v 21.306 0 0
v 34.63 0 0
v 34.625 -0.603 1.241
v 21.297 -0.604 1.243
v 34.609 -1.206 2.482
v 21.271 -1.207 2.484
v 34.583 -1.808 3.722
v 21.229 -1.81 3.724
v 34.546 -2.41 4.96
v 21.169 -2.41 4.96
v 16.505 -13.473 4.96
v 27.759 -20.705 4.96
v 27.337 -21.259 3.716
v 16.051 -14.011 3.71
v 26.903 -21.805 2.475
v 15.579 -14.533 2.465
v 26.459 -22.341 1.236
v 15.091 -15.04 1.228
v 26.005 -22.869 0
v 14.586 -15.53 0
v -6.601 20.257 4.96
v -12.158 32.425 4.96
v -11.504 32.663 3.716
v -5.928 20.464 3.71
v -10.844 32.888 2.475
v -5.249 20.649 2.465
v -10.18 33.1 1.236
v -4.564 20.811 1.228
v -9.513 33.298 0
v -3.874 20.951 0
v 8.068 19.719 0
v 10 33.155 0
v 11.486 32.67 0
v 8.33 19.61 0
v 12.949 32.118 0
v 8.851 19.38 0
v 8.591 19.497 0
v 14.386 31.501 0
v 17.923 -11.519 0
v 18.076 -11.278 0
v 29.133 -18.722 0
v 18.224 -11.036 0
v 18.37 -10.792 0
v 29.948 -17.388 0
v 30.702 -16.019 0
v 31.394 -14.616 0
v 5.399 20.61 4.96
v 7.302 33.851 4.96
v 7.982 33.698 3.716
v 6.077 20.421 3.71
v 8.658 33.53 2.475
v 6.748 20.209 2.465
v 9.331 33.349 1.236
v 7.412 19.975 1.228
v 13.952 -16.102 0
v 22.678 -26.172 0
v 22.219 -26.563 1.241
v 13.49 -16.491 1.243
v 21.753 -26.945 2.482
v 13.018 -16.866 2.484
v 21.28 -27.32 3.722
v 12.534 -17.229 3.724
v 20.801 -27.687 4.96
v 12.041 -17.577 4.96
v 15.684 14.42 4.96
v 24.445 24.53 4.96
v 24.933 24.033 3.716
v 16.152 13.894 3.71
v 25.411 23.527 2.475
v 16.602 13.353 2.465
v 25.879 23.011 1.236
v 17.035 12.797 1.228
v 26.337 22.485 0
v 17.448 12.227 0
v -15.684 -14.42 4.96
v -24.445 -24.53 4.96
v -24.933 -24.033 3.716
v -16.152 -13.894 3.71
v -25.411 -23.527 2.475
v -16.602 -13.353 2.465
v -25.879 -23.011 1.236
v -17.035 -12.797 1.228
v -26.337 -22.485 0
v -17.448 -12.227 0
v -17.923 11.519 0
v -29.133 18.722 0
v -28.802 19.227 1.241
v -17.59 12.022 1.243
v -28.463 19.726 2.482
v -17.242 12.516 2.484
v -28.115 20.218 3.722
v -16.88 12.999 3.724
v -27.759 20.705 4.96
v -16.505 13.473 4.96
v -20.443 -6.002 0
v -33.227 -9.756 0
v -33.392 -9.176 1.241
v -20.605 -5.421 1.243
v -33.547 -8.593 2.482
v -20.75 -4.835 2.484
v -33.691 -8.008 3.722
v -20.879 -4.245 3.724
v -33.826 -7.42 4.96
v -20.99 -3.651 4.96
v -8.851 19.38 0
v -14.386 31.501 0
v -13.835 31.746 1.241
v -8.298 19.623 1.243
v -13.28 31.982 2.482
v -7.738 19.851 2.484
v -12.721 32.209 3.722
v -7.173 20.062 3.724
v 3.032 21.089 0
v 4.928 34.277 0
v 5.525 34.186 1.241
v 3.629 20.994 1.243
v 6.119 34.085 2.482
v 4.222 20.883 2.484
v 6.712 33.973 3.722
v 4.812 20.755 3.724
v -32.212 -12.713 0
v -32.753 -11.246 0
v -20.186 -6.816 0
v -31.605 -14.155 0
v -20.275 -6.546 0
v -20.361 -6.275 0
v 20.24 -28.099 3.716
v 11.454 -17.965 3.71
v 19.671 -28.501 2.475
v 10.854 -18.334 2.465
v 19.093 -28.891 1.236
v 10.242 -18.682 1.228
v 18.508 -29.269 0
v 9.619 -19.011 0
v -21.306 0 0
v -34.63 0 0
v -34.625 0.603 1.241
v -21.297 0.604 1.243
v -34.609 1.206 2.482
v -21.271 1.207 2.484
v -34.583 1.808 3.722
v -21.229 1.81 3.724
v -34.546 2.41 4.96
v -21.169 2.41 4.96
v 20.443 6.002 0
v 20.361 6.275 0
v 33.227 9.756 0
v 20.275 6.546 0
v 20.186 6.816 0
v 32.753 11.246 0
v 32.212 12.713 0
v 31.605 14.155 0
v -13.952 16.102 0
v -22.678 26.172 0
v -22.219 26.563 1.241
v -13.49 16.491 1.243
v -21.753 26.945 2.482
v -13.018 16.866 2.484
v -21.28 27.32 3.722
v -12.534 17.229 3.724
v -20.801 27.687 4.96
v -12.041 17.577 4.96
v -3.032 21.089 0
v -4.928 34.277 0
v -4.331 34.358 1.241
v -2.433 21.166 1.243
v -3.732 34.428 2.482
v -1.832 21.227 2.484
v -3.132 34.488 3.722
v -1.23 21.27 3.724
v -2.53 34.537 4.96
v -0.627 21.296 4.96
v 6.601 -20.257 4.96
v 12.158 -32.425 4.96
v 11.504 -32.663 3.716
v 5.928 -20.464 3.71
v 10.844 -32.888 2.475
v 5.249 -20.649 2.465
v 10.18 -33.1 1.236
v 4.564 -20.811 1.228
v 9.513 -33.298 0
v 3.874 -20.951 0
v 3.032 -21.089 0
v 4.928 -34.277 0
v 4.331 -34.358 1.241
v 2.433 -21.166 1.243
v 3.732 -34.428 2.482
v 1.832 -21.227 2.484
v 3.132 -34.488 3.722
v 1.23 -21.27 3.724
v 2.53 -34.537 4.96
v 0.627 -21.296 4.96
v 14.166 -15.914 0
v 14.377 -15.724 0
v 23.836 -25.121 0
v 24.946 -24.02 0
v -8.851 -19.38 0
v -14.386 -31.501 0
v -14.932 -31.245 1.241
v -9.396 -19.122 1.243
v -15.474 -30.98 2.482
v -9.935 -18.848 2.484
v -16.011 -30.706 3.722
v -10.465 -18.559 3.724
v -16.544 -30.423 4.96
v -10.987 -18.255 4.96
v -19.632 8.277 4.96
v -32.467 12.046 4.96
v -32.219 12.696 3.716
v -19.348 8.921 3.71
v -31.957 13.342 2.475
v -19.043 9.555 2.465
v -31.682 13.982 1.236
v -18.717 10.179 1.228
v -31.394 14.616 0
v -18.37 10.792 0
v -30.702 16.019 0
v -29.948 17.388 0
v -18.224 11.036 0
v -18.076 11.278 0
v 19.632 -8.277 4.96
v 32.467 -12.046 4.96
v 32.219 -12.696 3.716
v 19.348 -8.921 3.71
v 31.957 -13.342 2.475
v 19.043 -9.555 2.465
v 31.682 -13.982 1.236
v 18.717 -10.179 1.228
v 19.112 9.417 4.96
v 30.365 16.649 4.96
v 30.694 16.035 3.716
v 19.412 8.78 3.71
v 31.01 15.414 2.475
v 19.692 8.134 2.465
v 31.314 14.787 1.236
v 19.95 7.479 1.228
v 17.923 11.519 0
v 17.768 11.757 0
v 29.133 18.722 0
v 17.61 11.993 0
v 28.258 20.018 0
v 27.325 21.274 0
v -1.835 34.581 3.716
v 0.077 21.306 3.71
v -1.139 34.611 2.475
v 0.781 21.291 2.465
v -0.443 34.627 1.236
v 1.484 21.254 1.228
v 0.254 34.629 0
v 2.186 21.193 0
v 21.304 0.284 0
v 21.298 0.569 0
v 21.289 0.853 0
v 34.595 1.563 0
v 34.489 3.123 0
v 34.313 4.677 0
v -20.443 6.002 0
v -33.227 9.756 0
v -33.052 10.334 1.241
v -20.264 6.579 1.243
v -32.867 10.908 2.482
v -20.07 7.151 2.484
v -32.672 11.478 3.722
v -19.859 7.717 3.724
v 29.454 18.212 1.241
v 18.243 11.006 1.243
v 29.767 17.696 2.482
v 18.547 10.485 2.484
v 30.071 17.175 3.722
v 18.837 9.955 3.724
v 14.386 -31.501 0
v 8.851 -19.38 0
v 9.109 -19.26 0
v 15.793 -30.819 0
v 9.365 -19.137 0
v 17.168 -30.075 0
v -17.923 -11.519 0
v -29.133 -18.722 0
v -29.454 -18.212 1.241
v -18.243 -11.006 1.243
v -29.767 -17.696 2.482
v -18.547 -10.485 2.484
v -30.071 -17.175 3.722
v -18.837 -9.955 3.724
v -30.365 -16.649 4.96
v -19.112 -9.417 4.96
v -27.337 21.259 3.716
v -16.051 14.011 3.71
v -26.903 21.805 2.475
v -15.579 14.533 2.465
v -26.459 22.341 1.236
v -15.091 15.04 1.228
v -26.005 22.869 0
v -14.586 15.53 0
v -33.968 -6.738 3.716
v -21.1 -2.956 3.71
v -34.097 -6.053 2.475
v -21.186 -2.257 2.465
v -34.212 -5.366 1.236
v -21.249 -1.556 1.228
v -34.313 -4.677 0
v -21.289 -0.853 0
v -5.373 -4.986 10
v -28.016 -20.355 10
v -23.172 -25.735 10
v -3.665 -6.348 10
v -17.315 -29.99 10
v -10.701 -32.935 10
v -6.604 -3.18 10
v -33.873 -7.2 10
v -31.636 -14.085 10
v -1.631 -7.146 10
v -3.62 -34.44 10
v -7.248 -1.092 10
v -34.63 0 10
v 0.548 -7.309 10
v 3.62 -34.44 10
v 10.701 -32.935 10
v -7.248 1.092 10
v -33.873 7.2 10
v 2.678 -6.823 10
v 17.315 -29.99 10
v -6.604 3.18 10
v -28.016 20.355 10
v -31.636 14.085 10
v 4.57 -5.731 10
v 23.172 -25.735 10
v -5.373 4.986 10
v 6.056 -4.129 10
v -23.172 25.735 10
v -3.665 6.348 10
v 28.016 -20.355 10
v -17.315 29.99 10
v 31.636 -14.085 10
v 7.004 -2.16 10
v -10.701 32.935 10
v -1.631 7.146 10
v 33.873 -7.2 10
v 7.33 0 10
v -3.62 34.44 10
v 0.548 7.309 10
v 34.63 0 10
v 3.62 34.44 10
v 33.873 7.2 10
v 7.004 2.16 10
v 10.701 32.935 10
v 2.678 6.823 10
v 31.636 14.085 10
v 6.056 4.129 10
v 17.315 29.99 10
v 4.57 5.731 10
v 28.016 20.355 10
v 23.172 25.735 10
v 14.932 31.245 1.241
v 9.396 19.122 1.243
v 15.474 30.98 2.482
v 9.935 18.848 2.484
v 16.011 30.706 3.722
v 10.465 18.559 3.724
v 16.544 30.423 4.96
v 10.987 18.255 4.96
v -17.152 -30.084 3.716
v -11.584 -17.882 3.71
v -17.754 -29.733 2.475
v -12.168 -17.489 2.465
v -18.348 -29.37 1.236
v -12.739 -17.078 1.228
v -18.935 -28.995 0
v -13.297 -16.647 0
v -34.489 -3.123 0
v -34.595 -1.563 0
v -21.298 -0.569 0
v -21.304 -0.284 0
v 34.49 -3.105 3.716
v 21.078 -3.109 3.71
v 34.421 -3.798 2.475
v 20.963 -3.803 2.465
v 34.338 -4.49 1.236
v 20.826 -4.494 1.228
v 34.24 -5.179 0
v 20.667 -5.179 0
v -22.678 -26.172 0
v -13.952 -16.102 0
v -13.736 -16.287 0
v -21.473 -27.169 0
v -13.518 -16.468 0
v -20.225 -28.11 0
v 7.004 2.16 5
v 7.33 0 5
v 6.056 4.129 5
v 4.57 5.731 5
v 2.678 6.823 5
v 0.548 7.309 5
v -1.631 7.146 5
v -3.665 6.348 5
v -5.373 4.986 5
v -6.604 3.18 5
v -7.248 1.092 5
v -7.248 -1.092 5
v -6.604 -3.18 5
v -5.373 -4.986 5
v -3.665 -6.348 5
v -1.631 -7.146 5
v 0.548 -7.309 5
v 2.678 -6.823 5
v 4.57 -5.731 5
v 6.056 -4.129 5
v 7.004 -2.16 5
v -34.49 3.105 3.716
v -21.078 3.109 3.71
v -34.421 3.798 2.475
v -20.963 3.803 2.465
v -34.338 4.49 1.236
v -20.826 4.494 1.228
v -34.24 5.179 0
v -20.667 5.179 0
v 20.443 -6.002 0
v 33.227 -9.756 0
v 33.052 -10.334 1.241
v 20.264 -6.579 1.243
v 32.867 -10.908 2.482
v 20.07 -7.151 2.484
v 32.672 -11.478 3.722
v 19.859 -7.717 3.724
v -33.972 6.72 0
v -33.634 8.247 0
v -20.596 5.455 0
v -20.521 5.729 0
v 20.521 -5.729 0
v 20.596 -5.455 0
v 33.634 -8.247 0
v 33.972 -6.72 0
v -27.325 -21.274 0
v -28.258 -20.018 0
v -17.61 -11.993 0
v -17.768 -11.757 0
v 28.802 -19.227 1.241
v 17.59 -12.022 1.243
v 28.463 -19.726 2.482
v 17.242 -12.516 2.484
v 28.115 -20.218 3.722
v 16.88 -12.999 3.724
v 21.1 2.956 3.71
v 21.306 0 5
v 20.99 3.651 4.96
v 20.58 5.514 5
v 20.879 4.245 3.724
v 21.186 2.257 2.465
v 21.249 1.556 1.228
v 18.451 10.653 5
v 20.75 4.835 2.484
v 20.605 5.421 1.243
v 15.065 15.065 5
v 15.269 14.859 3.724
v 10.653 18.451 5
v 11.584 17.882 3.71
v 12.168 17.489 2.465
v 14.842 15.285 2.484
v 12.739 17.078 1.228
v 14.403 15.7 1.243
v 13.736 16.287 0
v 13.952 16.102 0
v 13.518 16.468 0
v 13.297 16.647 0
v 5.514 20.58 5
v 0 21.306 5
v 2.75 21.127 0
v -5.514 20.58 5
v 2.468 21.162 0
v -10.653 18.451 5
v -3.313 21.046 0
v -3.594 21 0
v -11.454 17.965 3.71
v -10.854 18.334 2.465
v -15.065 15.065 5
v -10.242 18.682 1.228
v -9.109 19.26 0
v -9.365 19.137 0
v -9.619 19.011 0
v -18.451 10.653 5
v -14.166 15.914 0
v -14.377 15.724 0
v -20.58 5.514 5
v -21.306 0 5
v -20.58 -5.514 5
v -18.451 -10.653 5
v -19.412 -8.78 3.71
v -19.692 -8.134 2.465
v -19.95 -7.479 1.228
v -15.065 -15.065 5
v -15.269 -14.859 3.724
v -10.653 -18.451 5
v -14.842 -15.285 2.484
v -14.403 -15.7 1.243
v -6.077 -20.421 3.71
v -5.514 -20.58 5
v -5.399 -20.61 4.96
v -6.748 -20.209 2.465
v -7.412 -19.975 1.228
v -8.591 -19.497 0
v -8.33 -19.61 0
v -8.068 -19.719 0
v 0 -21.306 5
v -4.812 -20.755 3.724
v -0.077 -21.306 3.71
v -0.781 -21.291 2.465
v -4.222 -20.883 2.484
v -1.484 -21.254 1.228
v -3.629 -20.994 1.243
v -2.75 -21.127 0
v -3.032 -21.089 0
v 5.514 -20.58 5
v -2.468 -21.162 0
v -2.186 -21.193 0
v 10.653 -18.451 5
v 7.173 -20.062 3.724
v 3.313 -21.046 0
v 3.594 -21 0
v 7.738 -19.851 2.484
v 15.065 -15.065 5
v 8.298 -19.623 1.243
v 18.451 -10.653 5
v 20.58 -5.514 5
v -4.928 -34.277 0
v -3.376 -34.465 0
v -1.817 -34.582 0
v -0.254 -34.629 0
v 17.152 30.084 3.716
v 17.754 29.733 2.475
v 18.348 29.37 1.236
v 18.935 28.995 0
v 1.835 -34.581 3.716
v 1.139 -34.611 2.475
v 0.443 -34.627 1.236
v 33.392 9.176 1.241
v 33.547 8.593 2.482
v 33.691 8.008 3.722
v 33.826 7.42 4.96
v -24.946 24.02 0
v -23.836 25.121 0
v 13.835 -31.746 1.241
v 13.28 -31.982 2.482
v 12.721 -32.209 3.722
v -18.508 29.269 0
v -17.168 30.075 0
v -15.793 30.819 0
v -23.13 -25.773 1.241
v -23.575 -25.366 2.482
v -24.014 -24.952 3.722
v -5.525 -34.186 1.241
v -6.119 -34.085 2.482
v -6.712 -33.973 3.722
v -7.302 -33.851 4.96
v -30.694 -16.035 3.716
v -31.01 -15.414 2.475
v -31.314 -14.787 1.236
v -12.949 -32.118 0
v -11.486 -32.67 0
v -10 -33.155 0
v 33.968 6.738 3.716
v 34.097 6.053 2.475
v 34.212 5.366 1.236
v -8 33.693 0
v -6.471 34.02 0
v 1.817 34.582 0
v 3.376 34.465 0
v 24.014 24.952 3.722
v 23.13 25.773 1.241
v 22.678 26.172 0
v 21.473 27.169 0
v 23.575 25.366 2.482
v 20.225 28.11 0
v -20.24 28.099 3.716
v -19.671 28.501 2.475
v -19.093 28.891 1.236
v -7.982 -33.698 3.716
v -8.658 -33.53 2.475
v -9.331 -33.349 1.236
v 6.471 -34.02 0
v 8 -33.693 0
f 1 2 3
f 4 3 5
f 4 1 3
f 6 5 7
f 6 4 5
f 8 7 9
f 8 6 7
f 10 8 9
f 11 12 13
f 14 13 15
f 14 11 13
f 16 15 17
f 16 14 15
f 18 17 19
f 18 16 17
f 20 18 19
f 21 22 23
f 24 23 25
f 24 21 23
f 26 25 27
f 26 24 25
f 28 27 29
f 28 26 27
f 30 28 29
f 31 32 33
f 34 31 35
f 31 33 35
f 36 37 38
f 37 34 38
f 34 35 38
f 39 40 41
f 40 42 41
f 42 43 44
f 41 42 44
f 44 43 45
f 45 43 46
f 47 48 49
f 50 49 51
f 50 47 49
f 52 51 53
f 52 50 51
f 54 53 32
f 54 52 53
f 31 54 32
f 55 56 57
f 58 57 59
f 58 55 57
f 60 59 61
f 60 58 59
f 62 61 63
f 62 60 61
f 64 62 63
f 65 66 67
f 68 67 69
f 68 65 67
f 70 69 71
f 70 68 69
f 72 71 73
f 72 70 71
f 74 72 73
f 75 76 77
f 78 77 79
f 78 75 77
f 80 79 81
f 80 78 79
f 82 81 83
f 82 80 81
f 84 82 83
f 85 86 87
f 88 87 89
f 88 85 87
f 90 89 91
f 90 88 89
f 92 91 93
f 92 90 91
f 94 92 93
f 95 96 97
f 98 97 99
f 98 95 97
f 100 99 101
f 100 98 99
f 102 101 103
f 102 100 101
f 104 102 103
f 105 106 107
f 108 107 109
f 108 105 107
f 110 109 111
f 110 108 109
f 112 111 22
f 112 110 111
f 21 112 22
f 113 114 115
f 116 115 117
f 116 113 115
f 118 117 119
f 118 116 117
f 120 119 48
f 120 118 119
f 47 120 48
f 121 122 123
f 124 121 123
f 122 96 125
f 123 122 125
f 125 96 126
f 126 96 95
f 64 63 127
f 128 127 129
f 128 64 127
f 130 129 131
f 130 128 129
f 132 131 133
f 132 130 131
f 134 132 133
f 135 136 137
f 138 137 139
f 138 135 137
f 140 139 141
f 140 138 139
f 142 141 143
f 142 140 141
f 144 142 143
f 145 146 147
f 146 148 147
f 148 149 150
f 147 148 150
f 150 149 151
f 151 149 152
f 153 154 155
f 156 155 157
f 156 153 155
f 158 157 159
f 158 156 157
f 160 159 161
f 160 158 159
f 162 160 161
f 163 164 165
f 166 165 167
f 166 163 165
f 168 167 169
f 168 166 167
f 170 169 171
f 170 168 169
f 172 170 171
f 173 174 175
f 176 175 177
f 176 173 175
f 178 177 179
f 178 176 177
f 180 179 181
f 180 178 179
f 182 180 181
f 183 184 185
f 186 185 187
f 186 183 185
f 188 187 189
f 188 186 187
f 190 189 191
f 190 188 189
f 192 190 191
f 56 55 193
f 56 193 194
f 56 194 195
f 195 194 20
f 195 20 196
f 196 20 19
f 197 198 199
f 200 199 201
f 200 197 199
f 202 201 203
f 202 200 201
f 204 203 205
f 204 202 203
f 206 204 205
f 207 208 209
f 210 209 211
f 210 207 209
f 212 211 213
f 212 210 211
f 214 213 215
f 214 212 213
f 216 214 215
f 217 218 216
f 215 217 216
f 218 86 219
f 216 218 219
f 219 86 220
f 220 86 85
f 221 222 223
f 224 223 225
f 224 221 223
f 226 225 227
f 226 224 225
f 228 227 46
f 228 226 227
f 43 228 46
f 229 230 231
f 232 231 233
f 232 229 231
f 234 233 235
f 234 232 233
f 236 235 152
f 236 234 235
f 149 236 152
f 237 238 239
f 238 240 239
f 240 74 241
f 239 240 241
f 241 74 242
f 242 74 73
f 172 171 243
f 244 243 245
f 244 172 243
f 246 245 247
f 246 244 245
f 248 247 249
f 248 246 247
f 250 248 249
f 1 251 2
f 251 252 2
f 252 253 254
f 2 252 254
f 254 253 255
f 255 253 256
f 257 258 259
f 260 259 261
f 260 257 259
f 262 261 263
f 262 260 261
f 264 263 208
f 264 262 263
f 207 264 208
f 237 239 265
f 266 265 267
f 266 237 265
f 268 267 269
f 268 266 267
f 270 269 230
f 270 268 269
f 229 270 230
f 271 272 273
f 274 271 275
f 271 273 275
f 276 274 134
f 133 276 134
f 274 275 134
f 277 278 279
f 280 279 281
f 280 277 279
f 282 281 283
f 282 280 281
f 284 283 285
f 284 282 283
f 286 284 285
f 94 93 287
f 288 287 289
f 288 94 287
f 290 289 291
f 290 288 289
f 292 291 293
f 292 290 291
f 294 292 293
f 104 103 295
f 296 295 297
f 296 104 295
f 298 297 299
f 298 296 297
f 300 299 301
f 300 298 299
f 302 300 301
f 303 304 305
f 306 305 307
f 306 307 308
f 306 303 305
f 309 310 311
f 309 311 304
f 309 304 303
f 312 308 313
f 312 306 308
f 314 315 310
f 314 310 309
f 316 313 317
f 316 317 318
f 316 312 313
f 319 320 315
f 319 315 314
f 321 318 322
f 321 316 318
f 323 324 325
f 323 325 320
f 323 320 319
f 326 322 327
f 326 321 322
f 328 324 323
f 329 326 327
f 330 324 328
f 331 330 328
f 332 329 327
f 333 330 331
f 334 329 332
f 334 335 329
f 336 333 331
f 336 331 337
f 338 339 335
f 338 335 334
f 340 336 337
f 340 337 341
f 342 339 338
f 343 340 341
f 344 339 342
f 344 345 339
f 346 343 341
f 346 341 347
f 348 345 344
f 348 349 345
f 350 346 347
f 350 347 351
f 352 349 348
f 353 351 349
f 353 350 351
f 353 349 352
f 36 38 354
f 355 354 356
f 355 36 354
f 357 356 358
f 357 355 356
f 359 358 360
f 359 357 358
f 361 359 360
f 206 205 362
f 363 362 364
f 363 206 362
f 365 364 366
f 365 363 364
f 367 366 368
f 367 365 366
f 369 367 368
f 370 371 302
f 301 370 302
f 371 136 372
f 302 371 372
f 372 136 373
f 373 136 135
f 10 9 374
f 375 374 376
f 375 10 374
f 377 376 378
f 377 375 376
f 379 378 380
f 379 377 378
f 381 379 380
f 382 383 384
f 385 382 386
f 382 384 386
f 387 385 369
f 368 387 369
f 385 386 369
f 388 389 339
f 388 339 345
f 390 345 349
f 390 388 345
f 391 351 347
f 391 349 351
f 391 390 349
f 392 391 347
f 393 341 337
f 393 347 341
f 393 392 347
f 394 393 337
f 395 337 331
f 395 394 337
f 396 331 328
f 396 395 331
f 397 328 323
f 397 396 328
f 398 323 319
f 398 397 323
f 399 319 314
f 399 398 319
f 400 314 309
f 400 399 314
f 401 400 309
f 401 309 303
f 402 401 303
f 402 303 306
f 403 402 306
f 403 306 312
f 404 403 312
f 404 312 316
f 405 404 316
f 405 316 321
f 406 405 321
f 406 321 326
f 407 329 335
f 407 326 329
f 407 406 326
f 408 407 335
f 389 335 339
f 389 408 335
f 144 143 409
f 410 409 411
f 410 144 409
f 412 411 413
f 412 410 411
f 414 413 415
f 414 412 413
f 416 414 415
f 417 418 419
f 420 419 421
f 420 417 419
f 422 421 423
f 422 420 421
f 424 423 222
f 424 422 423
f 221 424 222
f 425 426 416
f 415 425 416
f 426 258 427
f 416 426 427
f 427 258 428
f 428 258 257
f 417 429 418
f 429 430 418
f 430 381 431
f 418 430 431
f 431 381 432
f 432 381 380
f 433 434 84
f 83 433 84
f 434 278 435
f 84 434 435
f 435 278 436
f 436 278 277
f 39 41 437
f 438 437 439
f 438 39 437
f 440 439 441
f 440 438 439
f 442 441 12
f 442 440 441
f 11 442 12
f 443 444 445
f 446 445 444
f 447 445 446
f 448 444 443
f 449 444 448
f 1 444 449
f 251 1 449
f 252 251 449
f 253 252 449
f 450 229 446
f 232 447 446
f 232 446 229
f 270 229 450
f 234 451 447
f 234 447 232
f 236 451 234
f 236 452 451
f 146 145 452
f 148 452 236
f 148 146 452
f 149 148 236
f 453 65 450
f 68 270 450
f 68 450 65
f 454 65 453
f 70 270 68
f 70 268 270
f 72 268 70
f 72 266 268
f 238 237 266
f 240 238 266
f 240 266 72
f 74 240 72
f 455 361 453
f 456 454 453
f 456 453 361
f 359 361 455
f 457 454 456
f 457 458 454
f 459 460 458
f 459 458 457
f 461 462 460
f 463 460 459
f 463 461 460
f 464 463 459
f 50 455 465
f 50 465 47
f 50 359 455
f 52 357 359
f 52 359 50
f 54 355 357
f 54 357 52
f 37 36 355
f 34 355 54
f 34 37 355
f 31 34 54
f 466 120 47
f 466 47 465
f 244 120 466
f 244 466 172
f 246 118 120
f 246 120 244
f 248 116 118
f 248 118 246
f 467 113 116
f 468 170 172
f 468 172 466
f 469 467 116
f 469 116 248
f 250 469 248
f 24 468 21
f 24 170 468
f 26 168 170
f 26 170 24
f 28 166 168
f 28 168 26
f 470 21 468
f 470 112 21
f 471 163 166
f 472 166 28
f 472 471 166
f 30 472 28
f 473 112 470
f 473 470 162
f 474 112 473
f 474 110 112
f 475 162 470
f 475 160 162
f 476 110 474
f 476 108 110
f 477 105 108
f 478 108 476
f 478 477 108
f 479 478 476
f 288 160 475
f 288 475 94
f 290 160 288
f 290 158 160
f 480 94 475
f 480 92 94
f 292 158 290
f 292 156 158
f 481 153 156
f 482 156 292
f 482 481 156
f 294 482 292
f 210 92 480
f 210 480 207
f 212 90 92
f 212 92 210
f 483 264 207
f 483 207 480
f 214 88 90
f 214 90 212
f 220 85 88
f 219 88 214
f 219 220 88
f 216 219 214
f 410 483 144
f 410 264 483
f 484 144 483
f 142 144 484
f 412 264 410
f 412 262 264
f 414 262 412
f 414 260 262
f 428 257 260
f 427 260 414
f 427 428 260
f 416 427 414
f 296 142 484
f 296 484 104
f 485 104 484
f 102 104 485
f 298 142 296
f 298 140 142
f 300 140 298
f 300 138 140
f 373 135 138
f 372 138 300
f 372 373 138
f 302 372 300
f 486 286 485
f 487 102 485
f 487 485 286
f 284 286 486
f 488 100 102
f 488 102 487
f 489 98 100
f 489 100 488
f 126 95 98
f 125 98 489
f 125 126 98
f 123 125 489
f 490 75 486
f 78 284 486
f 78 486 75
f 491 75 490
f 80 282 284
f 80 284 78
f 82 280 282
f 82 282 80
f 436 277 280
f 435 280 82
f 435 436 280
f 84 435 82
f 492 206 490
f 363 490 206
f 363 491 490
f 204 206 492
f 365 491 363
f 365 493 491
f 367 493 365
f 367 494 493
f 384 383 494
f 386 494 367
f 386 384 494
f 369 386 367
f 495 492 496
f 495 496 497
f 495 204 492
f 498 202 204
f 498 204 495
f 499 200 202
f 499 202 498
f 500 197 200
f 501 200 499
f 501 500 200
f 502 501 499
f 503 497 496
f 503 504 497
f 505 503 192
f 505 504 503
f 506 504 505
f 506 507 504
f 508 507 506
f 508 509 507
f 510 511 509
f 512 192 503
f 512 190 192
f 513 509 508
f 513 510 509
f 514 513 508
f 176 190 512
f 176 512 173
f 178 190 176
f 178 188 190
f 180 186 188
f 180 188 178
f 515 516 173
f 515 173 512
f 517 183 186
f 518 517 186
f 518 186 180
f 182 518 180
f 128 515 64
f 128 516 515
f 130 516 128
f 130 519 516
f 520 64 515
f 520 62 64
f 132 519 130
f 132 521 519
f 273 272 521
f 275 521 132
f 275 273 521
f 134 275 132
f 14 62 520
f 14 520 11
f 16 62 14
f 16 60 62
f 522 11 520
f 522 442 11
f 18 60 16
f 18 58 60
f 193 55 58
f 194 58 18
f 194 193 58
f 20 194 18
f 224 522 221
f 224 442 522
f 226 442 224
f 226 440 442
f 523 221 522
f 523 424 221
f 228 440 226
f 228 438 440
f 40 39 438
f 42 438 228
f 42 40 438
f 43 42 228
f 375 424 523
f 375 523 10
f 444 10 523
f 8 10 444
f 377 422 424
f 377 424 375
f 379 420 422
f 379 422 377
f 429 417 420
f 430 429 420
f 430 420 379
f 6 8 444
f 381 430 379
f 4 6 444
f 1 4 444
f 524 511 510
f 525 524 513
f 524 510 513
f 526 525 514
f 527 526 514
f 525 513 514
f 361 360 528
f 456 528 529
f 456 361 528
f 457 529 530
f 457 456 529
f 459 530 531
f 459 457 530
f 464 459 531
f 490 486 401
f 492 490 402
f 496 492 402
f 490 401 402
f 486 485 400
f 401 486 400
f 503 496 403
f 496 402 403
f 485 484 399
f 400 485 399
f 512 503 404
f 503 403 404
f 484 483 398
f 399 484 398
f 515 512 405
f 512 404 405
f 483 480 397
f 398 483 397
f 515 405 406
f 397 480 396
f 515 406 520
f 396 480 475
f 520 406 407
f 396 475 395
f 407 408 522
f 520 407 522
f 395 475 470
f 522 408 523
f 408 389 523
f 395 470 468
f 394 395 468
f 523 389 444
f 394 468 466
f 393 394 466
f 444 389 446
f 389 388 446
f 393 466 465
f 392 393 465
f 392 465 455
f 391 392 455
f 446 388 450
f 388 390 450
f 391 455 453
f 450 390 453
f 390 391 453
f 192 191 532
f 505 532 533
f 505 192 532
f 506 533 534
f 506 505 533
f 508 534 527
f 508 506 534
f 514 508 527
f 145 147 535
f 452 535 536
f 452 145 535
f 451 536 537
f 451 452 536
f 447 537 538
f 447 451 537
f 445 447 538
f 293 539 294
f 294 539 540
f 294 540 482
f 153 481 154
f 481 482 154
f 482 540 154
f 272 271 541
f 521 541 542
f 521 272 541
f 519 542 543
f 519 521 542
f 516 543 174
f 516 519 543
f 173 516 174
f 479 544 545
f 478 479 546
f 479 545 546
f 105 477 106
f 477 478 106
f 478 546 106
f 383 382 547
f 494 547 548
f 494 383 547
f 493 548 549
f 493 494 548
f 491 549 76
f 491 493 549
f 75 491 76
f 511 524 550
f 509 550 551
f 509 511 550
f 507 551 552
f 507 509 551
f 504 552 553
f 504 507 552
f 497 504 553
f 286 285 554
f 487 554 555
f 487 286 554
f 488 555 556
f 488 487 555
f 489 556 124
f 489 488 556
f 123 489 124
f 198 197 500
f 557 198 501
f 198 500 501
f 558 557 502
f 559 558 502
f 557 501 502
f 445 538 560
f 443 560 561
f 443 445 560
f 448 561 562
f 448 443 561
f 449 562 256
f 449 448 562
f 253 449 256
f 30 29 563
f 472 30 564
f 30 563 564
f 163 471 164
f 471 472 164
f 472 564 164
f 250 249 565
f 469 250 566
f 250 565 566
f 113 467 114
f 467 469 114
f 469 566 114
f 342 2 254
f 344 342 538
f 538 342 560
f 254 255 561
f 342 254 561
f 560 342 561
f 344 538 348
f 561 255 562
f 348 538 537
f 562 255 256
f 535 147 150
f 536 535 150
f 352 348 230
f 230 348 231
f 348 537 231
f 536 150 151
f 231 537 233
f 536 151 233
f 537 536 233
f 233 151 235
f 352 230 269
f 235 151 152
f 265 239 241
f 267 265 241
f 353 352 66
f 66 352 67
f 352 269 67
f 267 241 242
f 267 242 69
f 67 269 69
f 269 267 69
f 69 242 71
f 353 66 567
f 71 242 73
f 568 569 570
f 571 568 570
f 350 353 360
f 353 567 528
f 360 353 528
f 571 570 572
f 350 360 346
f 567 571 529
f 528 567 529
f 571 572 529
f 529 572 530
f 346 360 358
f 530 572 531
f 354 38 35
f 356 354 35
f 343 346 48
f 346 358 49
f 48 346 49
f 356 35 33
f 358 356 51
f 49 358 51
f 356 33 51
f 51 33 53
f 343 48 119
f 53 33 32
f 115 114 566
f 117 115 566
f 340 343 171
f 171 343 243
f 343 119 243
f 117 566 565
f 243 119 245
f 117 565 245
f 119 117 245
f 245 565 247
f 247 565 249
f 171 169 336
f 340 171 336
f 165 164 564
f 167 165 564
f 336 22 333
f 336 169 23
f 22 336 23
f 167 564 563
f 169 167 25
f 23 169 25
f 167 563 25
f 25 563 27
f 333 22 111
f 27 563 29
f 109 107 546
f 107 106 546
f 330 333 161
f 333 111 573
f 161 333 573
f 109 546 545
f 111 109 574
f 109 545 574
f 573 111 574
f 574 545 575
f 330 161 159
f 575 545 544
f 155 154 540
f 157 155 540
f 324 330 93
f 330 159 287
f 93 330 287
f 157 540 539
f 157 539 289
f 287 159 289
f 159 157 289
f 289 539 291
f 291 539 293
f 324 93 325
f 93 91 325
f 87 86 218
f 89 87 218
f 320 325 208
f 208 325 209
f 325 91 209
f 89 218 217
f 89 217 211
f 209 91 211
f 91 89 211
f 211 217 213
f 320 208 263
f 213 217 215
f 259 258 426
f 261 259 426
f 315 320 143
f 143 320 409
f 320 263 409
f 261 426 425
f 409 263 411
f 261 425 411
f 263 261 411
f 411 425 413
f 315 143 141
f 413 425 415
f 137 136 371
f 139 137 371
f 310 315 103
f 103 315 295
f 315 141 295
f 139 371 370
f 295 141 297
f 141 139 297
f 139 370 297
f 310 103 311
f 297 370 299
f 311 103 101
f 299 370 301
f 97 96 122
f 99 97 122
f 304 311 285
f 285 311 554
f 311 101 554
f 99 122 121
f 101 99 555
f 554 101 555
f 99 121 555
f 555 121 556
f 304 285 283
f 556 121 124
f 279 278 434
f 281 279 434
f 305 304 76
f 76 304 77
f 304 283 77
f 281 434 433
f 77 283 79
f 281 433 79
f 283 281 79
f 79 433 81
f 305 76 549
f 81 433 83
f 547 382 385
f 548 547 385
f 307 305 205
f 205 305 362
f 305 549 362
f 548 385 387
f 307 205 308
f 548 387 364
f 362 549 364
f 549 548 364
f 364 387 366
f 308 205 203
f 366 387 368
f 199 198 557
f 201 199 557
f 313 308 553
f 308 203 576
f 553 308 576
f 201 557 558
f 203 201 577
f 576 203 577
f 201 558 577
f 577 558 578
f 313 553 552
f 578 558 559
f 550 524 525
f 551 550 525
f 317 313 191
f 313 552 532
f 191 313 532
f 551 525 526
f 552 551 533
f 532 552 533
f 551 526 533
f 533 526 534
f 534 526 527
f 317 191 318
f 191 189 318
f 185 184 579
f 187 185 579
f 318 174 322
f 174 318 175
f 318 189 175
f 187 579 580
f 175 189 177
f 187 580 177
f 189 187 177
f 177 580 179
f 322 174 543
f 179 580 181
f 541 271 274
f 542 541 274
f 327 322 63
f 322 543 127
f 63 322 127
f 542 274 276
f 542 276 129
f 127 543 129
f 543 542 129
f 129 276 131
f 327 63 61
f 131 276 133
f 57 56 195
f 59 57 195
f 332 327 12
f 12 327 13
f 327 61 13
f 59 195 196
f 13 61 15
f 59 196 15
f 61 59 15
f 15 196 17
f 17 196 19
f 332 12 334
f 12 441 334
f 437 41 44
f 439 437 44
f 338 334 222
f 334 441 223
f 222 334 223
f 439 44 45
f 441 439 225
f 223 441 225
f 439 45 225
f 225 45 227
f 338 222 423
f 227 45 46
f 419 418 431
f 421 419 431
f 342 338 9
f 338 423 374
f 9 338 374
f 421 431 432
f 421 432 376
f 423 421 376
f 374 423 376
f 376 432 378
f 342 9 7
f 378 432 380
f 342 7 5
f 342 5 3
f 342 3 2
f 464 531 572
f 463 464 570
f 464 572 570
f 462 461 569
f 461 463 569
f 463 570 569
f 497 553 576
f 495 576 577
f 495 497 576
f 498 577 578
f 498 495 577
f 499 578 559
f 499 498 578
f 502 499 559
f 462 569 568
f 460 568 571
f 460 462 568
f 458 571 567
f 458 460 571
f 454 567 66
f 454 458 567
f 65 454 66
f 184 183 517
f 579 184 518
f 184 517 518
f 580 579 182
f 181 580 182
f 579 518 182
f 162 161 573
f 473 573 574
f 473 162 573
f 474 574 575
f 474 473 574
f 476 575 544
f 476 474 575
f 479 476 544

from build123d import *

# Parameters (mm, degrees)
SKETCH003_R        = 34.629948
PAD001_DEPTH       = 10
SKETCH004_R        = 21.305657
POCKET_DEPTH       = 5
SKETCH005_R        = 7.329797
POCKET001_DEPTH    = 11
POCKET002_DEPTH    = 38
POLARPATTERN_COUNT = 22


with BuildPart() as part:
    # Sketch003 → Pad001 (new body)
    with BuildSketch(Plane.XY):
        Circle(SKETCH003_R)
    extrude(amount=PAD001_DEPTH)

    # Sketch004 → Pocket (cut)
    with BuildSketch(Plane.XY):
        Circle(SKETCH004_R)
    extrude(amount=POCKET_DEPTH, mode=Mode.SUBTRACT)

    # Sketch005 → Pocket001 (cut)
    with BuildSketch(Plane.XY):
        Circle(SKETCH005_R)
    extrude(amount=POCKET001_DEPTH, mode=Mode.SUBTRACT)

    # Sketch006 → Pocket002 (cut)
    with BuildSketch(Plane.YZ):
        Polygon((0, 0), (2.410471, 4.960438), (5.179447, 0), align=None)
    pocket002 = extrude(amount=-POCKET002_DEPTH, mode=Mode.SUBTRACT)

    # PolarPattern: Pocket002 ×22 about axis
    polarpattern_axis = Axis((0, 0, 0), (0, 0, 1))
    for i in range(1, POLARPATTERN_COUNT):
        add(pocket002.rotate(polarpattern_axis, i * 360 / POLARPATTERN_COUNT), mode=Mode.SUBTRACT)


solid = part.part
